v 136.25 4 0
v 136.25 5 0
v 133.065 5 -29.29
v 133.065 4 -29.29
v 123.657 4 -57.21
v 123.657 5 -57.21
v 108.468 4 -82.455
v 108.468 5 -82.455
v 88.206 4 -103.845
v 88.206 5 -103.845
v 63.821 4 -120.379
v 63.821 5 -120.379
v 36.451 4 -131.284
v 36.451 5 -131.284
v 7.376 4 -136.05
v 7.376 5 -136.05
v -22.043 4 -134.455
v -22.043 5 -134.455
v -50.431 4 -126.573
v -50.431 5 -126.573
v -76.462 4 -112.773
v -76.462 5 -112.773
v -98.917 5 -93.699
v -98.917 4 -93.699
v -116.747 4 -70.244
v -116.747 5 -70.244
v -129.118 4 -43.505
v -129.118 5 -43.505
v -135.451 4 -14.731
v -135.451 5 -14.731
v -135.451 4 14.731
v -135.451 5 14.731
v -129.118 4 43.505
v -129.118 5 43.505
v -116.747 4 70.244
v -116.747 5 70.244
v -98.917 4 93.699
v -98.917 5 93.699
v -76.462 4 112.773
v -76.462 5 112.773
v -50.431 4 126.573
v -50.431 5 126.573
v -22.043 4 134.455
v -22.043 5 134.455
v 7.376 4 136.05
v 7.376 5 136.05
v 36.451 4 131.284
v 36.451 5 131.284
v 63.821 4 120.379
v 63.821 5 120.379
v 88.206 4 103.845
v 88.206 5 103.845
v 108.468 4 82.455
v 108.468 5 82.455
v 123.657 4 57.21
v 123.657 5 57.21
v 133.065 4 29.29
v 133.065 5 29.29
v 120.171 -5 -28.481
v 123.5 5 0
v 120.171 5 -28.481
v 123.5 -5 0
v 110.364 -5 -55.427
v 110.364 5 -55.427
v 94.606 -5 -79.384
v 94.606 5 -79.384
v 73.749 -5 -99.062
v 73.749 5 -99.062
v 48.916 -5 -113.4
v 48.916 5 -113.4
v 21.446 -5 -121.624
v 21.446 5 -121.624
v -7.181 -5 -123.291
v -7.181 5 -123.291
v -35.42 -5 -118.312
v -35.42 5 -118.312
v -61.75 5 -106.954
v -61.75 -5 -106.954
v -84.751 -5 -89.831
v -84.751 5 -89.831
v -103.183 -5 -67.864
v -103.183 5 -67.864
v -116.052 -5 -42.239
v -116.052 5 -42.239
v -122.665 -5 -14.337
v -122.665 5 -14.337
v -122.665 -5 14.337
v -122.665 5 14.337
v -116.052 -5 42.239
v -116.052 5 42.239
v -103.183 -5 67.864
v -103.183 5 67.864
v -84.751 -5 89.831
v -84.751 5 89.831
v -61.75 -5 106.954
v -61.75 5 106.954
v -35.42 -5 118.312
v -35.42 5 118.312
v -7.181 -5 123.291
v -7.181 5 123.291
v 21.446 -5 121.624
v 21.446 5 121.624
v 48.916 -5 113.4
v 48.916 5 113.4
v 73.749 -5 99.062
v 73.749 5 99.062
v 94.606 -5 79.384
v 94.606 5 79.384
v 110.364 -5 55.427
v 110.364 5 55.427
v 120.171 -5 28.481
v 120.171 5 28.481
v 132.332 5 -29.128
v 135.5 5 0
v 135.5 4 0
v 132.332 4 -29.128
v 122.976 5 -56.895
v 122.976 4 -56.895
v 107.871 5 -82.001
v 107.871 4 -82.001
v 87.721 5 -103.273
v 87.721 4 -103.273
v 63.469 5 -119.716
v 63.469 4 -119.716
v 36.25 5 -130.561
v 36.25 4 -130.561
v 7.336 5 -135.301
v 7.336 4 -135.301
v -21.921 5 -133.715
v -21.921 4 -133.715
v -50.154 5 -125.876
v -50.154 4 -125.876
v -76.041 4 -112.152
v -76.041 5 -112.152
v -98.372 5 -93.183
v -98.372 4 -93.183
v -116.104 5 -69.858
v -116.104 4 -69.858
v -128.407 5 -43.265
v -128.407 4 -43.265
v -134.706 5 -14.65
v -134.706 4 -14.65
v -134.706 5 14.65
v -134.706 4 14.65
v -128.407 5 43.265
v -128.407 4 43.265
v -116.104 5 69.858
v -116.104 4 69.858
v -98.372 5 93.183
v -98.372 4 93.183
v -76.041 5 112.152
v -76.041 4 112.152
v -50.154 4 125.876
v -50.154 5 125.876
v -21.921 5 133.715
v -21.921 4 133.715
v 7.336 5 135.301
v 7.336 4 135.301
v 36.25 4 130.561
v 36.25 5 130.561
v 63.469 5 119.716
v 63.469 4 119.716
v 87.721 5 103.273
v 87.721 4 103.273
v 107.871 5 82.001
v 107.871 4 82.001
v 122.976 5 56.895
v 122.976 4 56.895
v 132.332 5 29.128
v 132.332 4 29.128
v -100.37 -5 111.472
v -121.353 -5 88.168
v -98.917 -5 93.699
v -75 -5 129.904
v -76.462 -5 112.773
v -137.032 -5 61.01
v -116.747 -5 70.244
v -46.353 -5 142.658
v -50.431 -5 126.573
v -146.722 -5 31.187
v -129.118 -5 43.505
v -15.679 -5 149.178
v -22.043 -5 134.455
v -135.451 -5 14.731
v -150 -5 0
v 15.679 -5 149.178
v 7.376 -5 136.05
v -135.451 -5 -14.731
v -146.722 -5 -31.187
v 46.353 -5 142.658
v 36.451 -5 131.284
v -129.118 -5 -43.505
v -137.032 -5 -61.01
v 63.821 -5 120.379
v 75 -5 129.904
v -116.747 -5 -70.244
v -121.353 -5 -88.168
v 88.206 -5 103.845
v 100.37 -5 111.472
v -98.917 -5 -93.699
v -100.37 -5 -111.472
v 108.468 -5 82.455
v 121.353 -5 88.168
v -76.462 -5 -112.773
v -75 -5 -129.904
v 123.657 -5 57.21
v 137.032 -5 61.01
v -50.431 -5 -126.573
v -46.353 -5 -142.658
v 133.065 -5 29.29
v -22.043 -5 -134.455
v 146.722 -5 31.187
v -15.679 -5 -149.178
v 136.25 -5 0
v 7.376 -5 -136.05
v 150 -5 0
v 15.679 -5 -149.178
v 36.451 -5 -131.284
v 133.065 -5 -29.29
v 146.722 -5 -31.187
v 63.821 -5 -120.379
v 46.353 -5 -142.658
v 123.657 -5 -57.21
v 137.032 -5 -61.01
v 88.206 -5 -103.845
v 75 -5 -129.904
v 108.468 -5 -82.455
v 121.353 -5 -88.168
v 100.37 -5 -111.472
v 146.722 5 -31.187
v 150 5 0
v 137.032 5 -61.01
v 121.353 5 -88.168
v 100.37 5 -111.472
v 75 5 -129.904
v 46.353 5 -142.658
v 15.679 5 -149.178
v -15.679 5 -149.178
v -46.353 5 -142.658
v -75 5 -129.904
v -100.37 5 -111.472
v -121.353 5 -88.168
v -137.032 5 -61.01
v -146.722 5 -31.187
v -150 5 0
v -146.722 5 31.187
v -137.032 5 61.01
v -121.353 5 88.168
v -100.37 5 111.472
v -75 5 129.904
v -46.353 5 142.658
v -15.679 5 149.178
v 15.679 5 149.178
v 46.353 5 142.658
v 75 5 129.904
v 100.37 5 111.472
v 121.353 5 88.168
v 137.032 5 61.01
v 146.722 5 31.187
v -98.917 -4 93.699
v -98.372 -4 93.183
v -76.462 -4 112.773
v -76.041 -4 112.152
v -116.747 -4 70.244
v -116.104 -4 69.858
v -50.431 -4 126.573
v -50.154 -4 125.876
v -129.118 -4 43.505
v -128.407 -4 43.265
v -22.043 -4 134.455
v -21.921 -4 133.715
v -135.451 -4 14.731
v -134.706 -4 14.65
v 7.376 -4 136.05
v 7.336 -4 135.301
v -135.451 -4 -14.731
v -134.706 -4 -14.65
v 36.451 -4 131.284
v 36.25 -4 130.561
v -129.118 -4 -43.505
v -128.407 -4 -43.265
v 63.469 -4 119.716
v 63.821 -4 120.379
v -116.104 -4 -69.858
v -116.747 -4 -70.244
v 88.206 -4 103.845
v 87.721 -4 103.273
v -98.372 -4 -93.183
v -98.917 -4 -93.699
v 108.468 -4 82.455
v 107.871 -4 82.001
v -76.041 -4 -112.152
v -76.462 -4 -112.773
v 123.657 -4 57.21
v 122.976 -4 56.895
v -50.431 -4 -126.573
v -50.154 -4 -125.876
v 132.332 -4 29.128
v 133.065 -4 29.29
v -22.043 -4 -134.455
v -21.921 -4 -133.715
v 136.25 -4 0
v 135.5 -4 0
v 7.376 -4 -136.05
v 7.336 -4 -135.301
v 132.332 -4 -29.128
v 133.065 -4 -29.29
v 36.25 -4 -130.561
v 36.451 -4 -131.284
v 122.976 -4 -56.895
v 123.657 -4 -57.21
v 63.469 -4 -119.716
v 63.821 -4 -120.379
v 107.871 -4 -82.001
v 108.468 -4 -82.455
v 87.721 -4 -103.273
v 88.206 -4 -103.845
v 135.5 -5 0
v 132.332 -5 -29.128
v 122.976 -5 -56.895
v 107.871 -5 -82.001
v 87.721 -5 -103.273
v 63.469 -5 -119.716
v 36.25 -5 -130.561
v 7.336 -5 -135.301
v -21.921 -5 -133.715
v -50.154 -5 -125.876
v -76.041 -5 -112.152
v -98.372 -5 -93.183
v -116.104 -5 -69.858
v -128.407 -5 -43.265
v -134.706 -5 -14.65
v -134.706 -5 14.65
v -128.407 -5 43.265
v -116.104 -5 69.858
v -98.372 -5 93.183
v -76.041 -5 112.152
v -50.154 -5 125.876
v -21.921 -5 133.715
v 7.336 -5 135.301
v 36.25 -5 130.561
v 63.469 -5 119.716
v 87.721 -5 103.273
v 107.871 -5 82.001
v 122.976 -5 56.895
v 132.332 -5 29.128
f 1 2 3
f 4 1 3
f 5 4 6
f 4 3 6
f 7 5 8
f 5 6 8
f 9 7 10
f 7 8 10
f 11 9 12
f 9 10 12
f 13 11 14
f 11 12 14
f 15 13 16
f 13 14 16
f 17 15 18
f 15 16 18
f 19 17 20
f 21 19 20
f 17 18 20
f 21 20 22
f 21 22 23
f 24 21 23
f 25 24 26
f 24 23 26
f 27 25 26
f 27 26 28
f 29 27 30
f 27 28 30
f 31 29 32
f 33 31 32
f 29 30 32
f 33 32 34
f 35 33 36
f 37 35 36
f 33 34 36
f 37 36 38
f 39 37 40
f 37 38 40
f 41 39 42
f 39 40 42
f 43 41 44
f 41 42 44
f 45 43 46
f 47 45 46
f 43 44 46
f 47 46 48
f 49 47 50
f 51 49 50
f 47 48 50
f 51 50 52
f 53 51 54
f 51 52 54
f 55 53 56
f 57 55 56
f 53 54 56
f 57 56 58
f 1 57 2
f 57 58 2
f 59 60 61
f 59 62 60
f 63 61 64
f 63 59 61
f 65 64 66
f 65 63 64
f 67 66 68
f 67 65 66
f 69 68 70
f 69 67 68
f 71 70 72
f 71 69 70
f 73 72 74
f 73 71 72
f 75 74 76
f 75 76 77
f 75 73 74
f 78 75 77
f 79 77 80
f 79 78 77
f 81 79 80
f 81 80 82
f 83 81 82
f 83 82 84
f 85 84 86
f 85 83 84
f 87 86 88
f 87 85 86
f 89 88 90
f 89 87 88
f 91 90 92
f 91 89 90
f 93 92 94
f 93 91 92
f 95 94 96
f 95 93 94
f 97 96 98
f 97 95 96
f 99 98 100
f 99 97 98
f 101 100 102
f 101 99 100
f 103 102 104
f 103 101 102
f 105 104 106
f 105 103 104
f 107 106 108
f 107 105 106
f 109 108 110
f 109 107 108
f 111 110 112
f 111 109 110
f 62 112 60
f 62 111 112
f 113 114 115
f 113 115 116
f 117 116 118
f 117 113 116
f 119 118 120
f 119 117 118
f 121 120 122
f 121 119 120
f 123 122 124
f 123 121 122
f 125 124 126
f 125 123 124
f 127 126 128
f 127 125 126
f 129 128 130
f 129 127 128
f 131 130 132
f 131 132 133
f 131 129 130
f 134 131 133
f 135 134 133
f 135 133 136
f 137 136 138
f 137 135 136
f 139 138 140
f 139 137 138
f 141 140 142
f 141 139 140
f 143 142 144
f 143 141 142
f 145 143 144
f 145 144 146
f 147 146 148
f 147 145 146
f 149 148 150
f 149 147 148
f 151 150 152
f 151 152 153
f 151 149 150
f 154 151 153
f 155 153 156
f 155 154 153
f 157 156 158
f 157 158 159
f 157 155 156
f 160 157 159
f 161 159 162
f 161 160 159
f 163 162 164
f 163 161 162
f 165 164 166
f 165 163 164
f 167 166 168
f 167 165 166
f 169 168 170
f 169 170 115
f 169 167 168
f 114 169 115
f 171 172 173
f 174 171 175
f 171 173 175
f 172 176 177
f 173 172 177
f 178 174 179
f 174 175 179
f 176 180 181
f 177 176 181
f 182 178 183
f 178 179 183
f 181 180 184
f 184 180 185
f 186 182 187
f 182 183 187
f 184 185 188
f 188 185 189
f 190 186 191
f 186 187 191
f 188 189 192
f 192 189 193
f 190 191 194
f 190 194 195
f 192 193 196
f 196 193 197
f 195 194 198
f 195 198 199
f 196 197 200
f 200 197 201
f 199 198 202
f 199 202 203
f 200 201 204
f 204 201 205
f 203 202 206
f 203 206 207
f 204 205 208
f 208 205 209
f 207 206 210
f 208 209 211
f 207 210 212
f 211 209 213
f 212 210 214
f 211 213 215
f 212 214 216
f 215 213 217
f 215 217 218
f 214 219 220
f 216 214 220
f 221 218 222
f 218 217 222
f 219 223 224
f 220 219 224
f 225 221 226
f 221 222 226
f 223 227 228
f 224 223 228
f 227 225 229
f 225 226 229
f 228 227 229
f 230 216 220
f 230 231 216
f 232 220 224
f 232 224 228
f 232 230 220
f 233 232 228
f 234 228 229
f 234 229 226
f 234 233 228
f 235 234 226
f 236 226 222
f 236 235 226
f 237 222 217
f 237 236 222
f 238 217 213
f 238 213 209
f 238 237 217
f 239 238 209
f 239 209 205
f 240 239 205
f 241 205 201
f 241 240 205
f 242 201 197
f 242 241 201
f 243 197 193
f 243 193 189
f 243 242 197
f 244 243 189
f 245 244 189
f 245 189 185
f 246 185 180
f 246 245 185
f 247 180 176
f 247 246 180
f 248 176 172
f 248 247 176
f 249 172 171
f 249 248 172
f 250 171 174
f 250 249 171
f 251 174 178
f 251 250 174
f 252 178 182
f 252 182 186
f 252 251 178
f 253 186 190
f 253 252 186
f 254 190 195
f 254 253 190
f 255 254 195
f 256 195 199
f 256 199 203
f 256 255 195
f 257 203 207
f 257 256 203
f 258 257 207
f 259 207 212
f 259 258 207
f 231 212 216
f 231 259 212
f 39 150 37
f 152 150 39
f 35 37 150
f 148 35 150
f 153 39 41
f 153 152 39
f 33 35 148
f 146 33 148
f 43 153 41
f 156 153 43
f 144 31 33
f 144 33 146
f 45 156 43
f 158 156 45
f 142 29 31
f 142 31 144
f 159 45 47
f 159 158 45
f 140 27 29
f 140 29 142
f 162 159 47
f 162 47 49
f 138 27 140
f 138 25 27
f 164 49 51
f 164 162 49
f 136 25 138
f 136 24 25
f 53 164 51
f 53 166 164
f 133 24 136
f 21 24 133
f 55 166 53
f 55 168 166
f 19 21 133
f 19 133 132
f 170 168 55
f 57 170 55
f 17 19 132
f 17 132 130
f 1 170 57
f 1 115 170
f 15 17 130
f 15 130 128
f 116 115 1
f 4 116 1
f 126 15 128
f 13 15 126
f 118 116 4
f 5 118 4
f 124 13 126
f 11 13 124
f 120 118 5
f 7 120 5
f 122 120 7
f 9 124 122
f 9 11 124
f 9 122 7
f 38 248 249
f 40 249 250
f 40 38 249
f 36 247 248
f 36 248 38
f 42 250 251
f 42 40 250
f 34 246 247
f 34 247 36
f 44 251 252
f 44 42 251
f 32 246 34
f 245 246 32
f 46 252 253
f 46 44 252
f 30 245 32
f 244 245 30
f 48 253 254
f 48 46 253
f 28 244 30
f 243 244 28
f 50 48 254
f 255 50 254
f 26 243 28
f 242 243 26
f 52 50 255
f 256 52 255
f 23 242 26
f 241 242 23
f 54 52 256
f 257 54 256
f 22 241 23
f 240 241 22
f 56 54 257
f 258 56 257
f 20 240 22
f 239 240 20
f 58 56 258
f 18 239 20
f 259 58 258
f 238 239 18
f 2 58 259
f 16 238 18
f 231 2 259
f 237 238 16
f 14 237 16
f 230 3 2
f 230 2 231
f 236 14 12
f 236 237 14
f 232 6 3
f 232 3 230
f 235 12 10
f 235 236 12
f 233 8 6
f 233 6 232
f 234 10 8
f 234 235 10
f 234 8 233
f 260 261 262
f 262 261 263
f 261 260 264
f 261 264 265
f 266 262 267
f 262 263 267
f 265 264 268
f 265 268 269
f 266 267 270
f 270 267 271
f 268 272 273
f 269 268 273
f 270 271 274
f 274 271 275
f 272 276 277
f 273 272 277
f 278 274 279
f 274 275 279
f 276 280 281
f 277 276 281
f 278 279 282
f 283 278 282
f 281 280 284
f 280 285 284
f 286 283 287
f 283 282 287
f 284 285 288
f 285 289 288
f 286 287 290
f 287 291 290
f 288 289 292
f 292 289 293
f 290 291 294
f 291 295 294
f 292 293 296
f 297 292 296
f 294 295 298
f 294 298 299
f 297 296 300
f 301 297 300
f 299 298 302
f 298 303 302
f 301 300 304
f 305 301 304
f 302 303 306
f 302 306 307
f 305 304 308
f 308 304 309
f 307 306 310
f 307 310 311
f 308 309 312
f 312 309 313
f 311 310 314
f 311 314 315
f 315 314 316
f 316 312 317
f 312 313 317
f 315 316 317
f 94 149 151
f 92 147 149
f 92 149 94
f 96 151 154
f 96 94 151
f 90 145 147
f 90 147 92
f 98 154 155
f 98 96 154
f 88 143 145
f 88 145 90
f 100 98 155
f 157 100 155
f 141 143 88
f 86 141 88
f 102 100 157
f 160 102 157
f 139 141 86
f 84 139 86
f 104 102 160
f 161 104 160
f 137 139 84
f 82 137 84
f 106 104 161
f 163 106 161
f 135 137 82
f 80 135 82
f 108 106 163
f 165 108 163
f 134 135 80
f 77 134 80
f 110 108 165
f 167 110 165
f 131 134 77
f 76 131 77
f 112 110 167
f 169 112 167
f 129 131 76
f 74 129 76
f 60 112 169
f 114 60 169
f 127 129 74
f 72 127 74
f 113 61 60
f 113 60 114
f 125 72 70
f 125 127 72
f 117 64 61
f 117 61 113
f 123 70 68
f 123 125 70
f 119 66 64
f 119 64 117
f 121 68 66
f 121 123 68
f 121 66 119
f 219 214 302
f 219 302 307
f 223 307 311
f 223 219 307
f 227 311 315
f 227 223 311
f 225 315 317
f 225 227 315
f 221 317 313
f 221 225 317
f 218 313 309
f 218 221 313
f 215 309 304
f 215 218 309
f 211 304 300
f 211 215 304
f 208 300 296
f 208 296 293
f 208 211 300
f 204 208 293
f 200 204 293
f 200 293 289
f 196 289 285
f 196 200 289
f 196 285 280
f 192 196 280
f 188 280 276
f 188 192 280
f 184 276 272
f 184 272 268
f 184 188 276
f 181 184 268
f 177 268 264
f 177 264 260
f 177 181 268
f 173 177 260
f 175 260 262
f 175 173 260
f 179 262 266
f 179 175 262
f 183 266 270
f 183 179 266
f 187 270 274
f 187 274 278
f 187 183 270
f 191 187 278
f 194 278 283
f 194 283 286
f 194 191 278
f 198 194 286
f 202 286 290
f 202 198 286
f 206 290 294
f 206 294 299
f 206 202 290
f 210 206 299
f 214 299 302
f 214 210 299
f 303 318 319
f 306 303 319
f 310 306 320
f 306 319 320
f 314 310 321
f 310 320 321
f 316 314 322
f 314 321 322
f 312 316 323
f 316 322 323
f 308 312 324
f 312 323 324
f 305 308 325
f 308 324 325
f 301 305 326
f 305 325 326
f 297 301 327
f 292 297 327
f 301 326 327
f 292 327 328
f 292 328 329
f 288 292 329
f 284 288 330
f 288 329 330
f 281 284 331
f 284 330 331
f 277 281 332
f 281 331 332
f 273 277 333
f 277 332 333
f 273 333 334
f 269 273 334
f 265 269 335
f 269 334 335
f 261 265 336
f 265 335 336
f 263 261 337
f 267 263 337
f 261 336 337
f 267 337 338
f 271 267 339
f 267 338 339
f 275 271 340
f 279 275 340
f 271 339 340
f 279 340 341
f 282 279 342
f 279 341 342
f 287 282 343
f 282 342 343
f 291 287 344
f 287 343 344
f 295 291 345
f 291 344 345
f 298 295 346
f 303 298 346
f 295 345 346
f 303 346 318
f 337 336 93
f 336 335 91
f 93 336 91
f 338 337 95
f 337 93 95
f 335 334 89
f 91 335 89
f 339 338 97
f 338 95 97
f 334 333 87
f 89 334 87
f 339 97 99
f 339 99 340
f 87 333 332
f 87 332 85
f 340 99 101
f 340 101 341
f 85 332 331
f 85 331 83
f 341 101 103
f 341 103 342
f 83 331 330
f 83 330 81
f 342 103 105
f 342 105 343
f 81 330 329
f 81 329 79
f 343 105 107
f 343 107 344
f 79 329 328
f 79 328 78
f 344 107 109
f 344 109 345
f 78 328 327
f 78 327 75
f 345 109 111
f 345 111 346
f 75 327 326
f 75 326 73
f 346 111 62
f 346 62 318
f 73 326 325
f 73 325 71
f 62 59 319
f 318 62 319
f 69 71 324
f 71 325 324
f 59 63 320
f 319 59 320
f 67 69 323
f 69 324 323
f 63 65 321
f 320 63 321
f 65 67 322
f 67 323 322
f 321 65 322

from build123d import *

# Parameters (mm, degrees)
SKETCH1_R           = 150
SKETCH1_R_2         = 123.5
BOSS_EXTRUDE1_DEPTH = 5
SKETCH2_R           = 136.25
SKETCH2_R_2         = 135.5
CUT_EXTRUDE1_DEPTH  = 1


with BuildPart() as part:
    # Sketch1 → Boss-Extrude1 (new body, symmetric)
    with BuildSketch(Plane(origin=(0, 0, 0), x_dir=(1, 0, 0), z_dir=(0, 1, 0))):
        Circle(SKETCH1_R)
        Circle(SKETCH1_R_2, mode=Mode.SUBTRACT)
    extrude(amount=BOSS_EXTRUDE1_DEPTH, both=True)

    # Sketch2 → Cut-Extrude1 (cut)
    with BuildSketch(Plane(origin=(0, 5, 0), x_dir=(1, 0, 0), z_dir=(0, 1, 0))):
        Circle(SKETCH2_R)
        Circle(SKETCH2_R_2, mode=Mode.SUBTRACT)
    cut_extrude1 = extrude(amount=-CUT_EXTRUDE1_DEPTH, mode=Mode.SUBTRACT)

    # Mirror1: Cut-Extrude1 across plane
    add(cut_extrude1.mirror(Plane.ZX), mode=Mode.SUBTRACT)


solid = part.part
